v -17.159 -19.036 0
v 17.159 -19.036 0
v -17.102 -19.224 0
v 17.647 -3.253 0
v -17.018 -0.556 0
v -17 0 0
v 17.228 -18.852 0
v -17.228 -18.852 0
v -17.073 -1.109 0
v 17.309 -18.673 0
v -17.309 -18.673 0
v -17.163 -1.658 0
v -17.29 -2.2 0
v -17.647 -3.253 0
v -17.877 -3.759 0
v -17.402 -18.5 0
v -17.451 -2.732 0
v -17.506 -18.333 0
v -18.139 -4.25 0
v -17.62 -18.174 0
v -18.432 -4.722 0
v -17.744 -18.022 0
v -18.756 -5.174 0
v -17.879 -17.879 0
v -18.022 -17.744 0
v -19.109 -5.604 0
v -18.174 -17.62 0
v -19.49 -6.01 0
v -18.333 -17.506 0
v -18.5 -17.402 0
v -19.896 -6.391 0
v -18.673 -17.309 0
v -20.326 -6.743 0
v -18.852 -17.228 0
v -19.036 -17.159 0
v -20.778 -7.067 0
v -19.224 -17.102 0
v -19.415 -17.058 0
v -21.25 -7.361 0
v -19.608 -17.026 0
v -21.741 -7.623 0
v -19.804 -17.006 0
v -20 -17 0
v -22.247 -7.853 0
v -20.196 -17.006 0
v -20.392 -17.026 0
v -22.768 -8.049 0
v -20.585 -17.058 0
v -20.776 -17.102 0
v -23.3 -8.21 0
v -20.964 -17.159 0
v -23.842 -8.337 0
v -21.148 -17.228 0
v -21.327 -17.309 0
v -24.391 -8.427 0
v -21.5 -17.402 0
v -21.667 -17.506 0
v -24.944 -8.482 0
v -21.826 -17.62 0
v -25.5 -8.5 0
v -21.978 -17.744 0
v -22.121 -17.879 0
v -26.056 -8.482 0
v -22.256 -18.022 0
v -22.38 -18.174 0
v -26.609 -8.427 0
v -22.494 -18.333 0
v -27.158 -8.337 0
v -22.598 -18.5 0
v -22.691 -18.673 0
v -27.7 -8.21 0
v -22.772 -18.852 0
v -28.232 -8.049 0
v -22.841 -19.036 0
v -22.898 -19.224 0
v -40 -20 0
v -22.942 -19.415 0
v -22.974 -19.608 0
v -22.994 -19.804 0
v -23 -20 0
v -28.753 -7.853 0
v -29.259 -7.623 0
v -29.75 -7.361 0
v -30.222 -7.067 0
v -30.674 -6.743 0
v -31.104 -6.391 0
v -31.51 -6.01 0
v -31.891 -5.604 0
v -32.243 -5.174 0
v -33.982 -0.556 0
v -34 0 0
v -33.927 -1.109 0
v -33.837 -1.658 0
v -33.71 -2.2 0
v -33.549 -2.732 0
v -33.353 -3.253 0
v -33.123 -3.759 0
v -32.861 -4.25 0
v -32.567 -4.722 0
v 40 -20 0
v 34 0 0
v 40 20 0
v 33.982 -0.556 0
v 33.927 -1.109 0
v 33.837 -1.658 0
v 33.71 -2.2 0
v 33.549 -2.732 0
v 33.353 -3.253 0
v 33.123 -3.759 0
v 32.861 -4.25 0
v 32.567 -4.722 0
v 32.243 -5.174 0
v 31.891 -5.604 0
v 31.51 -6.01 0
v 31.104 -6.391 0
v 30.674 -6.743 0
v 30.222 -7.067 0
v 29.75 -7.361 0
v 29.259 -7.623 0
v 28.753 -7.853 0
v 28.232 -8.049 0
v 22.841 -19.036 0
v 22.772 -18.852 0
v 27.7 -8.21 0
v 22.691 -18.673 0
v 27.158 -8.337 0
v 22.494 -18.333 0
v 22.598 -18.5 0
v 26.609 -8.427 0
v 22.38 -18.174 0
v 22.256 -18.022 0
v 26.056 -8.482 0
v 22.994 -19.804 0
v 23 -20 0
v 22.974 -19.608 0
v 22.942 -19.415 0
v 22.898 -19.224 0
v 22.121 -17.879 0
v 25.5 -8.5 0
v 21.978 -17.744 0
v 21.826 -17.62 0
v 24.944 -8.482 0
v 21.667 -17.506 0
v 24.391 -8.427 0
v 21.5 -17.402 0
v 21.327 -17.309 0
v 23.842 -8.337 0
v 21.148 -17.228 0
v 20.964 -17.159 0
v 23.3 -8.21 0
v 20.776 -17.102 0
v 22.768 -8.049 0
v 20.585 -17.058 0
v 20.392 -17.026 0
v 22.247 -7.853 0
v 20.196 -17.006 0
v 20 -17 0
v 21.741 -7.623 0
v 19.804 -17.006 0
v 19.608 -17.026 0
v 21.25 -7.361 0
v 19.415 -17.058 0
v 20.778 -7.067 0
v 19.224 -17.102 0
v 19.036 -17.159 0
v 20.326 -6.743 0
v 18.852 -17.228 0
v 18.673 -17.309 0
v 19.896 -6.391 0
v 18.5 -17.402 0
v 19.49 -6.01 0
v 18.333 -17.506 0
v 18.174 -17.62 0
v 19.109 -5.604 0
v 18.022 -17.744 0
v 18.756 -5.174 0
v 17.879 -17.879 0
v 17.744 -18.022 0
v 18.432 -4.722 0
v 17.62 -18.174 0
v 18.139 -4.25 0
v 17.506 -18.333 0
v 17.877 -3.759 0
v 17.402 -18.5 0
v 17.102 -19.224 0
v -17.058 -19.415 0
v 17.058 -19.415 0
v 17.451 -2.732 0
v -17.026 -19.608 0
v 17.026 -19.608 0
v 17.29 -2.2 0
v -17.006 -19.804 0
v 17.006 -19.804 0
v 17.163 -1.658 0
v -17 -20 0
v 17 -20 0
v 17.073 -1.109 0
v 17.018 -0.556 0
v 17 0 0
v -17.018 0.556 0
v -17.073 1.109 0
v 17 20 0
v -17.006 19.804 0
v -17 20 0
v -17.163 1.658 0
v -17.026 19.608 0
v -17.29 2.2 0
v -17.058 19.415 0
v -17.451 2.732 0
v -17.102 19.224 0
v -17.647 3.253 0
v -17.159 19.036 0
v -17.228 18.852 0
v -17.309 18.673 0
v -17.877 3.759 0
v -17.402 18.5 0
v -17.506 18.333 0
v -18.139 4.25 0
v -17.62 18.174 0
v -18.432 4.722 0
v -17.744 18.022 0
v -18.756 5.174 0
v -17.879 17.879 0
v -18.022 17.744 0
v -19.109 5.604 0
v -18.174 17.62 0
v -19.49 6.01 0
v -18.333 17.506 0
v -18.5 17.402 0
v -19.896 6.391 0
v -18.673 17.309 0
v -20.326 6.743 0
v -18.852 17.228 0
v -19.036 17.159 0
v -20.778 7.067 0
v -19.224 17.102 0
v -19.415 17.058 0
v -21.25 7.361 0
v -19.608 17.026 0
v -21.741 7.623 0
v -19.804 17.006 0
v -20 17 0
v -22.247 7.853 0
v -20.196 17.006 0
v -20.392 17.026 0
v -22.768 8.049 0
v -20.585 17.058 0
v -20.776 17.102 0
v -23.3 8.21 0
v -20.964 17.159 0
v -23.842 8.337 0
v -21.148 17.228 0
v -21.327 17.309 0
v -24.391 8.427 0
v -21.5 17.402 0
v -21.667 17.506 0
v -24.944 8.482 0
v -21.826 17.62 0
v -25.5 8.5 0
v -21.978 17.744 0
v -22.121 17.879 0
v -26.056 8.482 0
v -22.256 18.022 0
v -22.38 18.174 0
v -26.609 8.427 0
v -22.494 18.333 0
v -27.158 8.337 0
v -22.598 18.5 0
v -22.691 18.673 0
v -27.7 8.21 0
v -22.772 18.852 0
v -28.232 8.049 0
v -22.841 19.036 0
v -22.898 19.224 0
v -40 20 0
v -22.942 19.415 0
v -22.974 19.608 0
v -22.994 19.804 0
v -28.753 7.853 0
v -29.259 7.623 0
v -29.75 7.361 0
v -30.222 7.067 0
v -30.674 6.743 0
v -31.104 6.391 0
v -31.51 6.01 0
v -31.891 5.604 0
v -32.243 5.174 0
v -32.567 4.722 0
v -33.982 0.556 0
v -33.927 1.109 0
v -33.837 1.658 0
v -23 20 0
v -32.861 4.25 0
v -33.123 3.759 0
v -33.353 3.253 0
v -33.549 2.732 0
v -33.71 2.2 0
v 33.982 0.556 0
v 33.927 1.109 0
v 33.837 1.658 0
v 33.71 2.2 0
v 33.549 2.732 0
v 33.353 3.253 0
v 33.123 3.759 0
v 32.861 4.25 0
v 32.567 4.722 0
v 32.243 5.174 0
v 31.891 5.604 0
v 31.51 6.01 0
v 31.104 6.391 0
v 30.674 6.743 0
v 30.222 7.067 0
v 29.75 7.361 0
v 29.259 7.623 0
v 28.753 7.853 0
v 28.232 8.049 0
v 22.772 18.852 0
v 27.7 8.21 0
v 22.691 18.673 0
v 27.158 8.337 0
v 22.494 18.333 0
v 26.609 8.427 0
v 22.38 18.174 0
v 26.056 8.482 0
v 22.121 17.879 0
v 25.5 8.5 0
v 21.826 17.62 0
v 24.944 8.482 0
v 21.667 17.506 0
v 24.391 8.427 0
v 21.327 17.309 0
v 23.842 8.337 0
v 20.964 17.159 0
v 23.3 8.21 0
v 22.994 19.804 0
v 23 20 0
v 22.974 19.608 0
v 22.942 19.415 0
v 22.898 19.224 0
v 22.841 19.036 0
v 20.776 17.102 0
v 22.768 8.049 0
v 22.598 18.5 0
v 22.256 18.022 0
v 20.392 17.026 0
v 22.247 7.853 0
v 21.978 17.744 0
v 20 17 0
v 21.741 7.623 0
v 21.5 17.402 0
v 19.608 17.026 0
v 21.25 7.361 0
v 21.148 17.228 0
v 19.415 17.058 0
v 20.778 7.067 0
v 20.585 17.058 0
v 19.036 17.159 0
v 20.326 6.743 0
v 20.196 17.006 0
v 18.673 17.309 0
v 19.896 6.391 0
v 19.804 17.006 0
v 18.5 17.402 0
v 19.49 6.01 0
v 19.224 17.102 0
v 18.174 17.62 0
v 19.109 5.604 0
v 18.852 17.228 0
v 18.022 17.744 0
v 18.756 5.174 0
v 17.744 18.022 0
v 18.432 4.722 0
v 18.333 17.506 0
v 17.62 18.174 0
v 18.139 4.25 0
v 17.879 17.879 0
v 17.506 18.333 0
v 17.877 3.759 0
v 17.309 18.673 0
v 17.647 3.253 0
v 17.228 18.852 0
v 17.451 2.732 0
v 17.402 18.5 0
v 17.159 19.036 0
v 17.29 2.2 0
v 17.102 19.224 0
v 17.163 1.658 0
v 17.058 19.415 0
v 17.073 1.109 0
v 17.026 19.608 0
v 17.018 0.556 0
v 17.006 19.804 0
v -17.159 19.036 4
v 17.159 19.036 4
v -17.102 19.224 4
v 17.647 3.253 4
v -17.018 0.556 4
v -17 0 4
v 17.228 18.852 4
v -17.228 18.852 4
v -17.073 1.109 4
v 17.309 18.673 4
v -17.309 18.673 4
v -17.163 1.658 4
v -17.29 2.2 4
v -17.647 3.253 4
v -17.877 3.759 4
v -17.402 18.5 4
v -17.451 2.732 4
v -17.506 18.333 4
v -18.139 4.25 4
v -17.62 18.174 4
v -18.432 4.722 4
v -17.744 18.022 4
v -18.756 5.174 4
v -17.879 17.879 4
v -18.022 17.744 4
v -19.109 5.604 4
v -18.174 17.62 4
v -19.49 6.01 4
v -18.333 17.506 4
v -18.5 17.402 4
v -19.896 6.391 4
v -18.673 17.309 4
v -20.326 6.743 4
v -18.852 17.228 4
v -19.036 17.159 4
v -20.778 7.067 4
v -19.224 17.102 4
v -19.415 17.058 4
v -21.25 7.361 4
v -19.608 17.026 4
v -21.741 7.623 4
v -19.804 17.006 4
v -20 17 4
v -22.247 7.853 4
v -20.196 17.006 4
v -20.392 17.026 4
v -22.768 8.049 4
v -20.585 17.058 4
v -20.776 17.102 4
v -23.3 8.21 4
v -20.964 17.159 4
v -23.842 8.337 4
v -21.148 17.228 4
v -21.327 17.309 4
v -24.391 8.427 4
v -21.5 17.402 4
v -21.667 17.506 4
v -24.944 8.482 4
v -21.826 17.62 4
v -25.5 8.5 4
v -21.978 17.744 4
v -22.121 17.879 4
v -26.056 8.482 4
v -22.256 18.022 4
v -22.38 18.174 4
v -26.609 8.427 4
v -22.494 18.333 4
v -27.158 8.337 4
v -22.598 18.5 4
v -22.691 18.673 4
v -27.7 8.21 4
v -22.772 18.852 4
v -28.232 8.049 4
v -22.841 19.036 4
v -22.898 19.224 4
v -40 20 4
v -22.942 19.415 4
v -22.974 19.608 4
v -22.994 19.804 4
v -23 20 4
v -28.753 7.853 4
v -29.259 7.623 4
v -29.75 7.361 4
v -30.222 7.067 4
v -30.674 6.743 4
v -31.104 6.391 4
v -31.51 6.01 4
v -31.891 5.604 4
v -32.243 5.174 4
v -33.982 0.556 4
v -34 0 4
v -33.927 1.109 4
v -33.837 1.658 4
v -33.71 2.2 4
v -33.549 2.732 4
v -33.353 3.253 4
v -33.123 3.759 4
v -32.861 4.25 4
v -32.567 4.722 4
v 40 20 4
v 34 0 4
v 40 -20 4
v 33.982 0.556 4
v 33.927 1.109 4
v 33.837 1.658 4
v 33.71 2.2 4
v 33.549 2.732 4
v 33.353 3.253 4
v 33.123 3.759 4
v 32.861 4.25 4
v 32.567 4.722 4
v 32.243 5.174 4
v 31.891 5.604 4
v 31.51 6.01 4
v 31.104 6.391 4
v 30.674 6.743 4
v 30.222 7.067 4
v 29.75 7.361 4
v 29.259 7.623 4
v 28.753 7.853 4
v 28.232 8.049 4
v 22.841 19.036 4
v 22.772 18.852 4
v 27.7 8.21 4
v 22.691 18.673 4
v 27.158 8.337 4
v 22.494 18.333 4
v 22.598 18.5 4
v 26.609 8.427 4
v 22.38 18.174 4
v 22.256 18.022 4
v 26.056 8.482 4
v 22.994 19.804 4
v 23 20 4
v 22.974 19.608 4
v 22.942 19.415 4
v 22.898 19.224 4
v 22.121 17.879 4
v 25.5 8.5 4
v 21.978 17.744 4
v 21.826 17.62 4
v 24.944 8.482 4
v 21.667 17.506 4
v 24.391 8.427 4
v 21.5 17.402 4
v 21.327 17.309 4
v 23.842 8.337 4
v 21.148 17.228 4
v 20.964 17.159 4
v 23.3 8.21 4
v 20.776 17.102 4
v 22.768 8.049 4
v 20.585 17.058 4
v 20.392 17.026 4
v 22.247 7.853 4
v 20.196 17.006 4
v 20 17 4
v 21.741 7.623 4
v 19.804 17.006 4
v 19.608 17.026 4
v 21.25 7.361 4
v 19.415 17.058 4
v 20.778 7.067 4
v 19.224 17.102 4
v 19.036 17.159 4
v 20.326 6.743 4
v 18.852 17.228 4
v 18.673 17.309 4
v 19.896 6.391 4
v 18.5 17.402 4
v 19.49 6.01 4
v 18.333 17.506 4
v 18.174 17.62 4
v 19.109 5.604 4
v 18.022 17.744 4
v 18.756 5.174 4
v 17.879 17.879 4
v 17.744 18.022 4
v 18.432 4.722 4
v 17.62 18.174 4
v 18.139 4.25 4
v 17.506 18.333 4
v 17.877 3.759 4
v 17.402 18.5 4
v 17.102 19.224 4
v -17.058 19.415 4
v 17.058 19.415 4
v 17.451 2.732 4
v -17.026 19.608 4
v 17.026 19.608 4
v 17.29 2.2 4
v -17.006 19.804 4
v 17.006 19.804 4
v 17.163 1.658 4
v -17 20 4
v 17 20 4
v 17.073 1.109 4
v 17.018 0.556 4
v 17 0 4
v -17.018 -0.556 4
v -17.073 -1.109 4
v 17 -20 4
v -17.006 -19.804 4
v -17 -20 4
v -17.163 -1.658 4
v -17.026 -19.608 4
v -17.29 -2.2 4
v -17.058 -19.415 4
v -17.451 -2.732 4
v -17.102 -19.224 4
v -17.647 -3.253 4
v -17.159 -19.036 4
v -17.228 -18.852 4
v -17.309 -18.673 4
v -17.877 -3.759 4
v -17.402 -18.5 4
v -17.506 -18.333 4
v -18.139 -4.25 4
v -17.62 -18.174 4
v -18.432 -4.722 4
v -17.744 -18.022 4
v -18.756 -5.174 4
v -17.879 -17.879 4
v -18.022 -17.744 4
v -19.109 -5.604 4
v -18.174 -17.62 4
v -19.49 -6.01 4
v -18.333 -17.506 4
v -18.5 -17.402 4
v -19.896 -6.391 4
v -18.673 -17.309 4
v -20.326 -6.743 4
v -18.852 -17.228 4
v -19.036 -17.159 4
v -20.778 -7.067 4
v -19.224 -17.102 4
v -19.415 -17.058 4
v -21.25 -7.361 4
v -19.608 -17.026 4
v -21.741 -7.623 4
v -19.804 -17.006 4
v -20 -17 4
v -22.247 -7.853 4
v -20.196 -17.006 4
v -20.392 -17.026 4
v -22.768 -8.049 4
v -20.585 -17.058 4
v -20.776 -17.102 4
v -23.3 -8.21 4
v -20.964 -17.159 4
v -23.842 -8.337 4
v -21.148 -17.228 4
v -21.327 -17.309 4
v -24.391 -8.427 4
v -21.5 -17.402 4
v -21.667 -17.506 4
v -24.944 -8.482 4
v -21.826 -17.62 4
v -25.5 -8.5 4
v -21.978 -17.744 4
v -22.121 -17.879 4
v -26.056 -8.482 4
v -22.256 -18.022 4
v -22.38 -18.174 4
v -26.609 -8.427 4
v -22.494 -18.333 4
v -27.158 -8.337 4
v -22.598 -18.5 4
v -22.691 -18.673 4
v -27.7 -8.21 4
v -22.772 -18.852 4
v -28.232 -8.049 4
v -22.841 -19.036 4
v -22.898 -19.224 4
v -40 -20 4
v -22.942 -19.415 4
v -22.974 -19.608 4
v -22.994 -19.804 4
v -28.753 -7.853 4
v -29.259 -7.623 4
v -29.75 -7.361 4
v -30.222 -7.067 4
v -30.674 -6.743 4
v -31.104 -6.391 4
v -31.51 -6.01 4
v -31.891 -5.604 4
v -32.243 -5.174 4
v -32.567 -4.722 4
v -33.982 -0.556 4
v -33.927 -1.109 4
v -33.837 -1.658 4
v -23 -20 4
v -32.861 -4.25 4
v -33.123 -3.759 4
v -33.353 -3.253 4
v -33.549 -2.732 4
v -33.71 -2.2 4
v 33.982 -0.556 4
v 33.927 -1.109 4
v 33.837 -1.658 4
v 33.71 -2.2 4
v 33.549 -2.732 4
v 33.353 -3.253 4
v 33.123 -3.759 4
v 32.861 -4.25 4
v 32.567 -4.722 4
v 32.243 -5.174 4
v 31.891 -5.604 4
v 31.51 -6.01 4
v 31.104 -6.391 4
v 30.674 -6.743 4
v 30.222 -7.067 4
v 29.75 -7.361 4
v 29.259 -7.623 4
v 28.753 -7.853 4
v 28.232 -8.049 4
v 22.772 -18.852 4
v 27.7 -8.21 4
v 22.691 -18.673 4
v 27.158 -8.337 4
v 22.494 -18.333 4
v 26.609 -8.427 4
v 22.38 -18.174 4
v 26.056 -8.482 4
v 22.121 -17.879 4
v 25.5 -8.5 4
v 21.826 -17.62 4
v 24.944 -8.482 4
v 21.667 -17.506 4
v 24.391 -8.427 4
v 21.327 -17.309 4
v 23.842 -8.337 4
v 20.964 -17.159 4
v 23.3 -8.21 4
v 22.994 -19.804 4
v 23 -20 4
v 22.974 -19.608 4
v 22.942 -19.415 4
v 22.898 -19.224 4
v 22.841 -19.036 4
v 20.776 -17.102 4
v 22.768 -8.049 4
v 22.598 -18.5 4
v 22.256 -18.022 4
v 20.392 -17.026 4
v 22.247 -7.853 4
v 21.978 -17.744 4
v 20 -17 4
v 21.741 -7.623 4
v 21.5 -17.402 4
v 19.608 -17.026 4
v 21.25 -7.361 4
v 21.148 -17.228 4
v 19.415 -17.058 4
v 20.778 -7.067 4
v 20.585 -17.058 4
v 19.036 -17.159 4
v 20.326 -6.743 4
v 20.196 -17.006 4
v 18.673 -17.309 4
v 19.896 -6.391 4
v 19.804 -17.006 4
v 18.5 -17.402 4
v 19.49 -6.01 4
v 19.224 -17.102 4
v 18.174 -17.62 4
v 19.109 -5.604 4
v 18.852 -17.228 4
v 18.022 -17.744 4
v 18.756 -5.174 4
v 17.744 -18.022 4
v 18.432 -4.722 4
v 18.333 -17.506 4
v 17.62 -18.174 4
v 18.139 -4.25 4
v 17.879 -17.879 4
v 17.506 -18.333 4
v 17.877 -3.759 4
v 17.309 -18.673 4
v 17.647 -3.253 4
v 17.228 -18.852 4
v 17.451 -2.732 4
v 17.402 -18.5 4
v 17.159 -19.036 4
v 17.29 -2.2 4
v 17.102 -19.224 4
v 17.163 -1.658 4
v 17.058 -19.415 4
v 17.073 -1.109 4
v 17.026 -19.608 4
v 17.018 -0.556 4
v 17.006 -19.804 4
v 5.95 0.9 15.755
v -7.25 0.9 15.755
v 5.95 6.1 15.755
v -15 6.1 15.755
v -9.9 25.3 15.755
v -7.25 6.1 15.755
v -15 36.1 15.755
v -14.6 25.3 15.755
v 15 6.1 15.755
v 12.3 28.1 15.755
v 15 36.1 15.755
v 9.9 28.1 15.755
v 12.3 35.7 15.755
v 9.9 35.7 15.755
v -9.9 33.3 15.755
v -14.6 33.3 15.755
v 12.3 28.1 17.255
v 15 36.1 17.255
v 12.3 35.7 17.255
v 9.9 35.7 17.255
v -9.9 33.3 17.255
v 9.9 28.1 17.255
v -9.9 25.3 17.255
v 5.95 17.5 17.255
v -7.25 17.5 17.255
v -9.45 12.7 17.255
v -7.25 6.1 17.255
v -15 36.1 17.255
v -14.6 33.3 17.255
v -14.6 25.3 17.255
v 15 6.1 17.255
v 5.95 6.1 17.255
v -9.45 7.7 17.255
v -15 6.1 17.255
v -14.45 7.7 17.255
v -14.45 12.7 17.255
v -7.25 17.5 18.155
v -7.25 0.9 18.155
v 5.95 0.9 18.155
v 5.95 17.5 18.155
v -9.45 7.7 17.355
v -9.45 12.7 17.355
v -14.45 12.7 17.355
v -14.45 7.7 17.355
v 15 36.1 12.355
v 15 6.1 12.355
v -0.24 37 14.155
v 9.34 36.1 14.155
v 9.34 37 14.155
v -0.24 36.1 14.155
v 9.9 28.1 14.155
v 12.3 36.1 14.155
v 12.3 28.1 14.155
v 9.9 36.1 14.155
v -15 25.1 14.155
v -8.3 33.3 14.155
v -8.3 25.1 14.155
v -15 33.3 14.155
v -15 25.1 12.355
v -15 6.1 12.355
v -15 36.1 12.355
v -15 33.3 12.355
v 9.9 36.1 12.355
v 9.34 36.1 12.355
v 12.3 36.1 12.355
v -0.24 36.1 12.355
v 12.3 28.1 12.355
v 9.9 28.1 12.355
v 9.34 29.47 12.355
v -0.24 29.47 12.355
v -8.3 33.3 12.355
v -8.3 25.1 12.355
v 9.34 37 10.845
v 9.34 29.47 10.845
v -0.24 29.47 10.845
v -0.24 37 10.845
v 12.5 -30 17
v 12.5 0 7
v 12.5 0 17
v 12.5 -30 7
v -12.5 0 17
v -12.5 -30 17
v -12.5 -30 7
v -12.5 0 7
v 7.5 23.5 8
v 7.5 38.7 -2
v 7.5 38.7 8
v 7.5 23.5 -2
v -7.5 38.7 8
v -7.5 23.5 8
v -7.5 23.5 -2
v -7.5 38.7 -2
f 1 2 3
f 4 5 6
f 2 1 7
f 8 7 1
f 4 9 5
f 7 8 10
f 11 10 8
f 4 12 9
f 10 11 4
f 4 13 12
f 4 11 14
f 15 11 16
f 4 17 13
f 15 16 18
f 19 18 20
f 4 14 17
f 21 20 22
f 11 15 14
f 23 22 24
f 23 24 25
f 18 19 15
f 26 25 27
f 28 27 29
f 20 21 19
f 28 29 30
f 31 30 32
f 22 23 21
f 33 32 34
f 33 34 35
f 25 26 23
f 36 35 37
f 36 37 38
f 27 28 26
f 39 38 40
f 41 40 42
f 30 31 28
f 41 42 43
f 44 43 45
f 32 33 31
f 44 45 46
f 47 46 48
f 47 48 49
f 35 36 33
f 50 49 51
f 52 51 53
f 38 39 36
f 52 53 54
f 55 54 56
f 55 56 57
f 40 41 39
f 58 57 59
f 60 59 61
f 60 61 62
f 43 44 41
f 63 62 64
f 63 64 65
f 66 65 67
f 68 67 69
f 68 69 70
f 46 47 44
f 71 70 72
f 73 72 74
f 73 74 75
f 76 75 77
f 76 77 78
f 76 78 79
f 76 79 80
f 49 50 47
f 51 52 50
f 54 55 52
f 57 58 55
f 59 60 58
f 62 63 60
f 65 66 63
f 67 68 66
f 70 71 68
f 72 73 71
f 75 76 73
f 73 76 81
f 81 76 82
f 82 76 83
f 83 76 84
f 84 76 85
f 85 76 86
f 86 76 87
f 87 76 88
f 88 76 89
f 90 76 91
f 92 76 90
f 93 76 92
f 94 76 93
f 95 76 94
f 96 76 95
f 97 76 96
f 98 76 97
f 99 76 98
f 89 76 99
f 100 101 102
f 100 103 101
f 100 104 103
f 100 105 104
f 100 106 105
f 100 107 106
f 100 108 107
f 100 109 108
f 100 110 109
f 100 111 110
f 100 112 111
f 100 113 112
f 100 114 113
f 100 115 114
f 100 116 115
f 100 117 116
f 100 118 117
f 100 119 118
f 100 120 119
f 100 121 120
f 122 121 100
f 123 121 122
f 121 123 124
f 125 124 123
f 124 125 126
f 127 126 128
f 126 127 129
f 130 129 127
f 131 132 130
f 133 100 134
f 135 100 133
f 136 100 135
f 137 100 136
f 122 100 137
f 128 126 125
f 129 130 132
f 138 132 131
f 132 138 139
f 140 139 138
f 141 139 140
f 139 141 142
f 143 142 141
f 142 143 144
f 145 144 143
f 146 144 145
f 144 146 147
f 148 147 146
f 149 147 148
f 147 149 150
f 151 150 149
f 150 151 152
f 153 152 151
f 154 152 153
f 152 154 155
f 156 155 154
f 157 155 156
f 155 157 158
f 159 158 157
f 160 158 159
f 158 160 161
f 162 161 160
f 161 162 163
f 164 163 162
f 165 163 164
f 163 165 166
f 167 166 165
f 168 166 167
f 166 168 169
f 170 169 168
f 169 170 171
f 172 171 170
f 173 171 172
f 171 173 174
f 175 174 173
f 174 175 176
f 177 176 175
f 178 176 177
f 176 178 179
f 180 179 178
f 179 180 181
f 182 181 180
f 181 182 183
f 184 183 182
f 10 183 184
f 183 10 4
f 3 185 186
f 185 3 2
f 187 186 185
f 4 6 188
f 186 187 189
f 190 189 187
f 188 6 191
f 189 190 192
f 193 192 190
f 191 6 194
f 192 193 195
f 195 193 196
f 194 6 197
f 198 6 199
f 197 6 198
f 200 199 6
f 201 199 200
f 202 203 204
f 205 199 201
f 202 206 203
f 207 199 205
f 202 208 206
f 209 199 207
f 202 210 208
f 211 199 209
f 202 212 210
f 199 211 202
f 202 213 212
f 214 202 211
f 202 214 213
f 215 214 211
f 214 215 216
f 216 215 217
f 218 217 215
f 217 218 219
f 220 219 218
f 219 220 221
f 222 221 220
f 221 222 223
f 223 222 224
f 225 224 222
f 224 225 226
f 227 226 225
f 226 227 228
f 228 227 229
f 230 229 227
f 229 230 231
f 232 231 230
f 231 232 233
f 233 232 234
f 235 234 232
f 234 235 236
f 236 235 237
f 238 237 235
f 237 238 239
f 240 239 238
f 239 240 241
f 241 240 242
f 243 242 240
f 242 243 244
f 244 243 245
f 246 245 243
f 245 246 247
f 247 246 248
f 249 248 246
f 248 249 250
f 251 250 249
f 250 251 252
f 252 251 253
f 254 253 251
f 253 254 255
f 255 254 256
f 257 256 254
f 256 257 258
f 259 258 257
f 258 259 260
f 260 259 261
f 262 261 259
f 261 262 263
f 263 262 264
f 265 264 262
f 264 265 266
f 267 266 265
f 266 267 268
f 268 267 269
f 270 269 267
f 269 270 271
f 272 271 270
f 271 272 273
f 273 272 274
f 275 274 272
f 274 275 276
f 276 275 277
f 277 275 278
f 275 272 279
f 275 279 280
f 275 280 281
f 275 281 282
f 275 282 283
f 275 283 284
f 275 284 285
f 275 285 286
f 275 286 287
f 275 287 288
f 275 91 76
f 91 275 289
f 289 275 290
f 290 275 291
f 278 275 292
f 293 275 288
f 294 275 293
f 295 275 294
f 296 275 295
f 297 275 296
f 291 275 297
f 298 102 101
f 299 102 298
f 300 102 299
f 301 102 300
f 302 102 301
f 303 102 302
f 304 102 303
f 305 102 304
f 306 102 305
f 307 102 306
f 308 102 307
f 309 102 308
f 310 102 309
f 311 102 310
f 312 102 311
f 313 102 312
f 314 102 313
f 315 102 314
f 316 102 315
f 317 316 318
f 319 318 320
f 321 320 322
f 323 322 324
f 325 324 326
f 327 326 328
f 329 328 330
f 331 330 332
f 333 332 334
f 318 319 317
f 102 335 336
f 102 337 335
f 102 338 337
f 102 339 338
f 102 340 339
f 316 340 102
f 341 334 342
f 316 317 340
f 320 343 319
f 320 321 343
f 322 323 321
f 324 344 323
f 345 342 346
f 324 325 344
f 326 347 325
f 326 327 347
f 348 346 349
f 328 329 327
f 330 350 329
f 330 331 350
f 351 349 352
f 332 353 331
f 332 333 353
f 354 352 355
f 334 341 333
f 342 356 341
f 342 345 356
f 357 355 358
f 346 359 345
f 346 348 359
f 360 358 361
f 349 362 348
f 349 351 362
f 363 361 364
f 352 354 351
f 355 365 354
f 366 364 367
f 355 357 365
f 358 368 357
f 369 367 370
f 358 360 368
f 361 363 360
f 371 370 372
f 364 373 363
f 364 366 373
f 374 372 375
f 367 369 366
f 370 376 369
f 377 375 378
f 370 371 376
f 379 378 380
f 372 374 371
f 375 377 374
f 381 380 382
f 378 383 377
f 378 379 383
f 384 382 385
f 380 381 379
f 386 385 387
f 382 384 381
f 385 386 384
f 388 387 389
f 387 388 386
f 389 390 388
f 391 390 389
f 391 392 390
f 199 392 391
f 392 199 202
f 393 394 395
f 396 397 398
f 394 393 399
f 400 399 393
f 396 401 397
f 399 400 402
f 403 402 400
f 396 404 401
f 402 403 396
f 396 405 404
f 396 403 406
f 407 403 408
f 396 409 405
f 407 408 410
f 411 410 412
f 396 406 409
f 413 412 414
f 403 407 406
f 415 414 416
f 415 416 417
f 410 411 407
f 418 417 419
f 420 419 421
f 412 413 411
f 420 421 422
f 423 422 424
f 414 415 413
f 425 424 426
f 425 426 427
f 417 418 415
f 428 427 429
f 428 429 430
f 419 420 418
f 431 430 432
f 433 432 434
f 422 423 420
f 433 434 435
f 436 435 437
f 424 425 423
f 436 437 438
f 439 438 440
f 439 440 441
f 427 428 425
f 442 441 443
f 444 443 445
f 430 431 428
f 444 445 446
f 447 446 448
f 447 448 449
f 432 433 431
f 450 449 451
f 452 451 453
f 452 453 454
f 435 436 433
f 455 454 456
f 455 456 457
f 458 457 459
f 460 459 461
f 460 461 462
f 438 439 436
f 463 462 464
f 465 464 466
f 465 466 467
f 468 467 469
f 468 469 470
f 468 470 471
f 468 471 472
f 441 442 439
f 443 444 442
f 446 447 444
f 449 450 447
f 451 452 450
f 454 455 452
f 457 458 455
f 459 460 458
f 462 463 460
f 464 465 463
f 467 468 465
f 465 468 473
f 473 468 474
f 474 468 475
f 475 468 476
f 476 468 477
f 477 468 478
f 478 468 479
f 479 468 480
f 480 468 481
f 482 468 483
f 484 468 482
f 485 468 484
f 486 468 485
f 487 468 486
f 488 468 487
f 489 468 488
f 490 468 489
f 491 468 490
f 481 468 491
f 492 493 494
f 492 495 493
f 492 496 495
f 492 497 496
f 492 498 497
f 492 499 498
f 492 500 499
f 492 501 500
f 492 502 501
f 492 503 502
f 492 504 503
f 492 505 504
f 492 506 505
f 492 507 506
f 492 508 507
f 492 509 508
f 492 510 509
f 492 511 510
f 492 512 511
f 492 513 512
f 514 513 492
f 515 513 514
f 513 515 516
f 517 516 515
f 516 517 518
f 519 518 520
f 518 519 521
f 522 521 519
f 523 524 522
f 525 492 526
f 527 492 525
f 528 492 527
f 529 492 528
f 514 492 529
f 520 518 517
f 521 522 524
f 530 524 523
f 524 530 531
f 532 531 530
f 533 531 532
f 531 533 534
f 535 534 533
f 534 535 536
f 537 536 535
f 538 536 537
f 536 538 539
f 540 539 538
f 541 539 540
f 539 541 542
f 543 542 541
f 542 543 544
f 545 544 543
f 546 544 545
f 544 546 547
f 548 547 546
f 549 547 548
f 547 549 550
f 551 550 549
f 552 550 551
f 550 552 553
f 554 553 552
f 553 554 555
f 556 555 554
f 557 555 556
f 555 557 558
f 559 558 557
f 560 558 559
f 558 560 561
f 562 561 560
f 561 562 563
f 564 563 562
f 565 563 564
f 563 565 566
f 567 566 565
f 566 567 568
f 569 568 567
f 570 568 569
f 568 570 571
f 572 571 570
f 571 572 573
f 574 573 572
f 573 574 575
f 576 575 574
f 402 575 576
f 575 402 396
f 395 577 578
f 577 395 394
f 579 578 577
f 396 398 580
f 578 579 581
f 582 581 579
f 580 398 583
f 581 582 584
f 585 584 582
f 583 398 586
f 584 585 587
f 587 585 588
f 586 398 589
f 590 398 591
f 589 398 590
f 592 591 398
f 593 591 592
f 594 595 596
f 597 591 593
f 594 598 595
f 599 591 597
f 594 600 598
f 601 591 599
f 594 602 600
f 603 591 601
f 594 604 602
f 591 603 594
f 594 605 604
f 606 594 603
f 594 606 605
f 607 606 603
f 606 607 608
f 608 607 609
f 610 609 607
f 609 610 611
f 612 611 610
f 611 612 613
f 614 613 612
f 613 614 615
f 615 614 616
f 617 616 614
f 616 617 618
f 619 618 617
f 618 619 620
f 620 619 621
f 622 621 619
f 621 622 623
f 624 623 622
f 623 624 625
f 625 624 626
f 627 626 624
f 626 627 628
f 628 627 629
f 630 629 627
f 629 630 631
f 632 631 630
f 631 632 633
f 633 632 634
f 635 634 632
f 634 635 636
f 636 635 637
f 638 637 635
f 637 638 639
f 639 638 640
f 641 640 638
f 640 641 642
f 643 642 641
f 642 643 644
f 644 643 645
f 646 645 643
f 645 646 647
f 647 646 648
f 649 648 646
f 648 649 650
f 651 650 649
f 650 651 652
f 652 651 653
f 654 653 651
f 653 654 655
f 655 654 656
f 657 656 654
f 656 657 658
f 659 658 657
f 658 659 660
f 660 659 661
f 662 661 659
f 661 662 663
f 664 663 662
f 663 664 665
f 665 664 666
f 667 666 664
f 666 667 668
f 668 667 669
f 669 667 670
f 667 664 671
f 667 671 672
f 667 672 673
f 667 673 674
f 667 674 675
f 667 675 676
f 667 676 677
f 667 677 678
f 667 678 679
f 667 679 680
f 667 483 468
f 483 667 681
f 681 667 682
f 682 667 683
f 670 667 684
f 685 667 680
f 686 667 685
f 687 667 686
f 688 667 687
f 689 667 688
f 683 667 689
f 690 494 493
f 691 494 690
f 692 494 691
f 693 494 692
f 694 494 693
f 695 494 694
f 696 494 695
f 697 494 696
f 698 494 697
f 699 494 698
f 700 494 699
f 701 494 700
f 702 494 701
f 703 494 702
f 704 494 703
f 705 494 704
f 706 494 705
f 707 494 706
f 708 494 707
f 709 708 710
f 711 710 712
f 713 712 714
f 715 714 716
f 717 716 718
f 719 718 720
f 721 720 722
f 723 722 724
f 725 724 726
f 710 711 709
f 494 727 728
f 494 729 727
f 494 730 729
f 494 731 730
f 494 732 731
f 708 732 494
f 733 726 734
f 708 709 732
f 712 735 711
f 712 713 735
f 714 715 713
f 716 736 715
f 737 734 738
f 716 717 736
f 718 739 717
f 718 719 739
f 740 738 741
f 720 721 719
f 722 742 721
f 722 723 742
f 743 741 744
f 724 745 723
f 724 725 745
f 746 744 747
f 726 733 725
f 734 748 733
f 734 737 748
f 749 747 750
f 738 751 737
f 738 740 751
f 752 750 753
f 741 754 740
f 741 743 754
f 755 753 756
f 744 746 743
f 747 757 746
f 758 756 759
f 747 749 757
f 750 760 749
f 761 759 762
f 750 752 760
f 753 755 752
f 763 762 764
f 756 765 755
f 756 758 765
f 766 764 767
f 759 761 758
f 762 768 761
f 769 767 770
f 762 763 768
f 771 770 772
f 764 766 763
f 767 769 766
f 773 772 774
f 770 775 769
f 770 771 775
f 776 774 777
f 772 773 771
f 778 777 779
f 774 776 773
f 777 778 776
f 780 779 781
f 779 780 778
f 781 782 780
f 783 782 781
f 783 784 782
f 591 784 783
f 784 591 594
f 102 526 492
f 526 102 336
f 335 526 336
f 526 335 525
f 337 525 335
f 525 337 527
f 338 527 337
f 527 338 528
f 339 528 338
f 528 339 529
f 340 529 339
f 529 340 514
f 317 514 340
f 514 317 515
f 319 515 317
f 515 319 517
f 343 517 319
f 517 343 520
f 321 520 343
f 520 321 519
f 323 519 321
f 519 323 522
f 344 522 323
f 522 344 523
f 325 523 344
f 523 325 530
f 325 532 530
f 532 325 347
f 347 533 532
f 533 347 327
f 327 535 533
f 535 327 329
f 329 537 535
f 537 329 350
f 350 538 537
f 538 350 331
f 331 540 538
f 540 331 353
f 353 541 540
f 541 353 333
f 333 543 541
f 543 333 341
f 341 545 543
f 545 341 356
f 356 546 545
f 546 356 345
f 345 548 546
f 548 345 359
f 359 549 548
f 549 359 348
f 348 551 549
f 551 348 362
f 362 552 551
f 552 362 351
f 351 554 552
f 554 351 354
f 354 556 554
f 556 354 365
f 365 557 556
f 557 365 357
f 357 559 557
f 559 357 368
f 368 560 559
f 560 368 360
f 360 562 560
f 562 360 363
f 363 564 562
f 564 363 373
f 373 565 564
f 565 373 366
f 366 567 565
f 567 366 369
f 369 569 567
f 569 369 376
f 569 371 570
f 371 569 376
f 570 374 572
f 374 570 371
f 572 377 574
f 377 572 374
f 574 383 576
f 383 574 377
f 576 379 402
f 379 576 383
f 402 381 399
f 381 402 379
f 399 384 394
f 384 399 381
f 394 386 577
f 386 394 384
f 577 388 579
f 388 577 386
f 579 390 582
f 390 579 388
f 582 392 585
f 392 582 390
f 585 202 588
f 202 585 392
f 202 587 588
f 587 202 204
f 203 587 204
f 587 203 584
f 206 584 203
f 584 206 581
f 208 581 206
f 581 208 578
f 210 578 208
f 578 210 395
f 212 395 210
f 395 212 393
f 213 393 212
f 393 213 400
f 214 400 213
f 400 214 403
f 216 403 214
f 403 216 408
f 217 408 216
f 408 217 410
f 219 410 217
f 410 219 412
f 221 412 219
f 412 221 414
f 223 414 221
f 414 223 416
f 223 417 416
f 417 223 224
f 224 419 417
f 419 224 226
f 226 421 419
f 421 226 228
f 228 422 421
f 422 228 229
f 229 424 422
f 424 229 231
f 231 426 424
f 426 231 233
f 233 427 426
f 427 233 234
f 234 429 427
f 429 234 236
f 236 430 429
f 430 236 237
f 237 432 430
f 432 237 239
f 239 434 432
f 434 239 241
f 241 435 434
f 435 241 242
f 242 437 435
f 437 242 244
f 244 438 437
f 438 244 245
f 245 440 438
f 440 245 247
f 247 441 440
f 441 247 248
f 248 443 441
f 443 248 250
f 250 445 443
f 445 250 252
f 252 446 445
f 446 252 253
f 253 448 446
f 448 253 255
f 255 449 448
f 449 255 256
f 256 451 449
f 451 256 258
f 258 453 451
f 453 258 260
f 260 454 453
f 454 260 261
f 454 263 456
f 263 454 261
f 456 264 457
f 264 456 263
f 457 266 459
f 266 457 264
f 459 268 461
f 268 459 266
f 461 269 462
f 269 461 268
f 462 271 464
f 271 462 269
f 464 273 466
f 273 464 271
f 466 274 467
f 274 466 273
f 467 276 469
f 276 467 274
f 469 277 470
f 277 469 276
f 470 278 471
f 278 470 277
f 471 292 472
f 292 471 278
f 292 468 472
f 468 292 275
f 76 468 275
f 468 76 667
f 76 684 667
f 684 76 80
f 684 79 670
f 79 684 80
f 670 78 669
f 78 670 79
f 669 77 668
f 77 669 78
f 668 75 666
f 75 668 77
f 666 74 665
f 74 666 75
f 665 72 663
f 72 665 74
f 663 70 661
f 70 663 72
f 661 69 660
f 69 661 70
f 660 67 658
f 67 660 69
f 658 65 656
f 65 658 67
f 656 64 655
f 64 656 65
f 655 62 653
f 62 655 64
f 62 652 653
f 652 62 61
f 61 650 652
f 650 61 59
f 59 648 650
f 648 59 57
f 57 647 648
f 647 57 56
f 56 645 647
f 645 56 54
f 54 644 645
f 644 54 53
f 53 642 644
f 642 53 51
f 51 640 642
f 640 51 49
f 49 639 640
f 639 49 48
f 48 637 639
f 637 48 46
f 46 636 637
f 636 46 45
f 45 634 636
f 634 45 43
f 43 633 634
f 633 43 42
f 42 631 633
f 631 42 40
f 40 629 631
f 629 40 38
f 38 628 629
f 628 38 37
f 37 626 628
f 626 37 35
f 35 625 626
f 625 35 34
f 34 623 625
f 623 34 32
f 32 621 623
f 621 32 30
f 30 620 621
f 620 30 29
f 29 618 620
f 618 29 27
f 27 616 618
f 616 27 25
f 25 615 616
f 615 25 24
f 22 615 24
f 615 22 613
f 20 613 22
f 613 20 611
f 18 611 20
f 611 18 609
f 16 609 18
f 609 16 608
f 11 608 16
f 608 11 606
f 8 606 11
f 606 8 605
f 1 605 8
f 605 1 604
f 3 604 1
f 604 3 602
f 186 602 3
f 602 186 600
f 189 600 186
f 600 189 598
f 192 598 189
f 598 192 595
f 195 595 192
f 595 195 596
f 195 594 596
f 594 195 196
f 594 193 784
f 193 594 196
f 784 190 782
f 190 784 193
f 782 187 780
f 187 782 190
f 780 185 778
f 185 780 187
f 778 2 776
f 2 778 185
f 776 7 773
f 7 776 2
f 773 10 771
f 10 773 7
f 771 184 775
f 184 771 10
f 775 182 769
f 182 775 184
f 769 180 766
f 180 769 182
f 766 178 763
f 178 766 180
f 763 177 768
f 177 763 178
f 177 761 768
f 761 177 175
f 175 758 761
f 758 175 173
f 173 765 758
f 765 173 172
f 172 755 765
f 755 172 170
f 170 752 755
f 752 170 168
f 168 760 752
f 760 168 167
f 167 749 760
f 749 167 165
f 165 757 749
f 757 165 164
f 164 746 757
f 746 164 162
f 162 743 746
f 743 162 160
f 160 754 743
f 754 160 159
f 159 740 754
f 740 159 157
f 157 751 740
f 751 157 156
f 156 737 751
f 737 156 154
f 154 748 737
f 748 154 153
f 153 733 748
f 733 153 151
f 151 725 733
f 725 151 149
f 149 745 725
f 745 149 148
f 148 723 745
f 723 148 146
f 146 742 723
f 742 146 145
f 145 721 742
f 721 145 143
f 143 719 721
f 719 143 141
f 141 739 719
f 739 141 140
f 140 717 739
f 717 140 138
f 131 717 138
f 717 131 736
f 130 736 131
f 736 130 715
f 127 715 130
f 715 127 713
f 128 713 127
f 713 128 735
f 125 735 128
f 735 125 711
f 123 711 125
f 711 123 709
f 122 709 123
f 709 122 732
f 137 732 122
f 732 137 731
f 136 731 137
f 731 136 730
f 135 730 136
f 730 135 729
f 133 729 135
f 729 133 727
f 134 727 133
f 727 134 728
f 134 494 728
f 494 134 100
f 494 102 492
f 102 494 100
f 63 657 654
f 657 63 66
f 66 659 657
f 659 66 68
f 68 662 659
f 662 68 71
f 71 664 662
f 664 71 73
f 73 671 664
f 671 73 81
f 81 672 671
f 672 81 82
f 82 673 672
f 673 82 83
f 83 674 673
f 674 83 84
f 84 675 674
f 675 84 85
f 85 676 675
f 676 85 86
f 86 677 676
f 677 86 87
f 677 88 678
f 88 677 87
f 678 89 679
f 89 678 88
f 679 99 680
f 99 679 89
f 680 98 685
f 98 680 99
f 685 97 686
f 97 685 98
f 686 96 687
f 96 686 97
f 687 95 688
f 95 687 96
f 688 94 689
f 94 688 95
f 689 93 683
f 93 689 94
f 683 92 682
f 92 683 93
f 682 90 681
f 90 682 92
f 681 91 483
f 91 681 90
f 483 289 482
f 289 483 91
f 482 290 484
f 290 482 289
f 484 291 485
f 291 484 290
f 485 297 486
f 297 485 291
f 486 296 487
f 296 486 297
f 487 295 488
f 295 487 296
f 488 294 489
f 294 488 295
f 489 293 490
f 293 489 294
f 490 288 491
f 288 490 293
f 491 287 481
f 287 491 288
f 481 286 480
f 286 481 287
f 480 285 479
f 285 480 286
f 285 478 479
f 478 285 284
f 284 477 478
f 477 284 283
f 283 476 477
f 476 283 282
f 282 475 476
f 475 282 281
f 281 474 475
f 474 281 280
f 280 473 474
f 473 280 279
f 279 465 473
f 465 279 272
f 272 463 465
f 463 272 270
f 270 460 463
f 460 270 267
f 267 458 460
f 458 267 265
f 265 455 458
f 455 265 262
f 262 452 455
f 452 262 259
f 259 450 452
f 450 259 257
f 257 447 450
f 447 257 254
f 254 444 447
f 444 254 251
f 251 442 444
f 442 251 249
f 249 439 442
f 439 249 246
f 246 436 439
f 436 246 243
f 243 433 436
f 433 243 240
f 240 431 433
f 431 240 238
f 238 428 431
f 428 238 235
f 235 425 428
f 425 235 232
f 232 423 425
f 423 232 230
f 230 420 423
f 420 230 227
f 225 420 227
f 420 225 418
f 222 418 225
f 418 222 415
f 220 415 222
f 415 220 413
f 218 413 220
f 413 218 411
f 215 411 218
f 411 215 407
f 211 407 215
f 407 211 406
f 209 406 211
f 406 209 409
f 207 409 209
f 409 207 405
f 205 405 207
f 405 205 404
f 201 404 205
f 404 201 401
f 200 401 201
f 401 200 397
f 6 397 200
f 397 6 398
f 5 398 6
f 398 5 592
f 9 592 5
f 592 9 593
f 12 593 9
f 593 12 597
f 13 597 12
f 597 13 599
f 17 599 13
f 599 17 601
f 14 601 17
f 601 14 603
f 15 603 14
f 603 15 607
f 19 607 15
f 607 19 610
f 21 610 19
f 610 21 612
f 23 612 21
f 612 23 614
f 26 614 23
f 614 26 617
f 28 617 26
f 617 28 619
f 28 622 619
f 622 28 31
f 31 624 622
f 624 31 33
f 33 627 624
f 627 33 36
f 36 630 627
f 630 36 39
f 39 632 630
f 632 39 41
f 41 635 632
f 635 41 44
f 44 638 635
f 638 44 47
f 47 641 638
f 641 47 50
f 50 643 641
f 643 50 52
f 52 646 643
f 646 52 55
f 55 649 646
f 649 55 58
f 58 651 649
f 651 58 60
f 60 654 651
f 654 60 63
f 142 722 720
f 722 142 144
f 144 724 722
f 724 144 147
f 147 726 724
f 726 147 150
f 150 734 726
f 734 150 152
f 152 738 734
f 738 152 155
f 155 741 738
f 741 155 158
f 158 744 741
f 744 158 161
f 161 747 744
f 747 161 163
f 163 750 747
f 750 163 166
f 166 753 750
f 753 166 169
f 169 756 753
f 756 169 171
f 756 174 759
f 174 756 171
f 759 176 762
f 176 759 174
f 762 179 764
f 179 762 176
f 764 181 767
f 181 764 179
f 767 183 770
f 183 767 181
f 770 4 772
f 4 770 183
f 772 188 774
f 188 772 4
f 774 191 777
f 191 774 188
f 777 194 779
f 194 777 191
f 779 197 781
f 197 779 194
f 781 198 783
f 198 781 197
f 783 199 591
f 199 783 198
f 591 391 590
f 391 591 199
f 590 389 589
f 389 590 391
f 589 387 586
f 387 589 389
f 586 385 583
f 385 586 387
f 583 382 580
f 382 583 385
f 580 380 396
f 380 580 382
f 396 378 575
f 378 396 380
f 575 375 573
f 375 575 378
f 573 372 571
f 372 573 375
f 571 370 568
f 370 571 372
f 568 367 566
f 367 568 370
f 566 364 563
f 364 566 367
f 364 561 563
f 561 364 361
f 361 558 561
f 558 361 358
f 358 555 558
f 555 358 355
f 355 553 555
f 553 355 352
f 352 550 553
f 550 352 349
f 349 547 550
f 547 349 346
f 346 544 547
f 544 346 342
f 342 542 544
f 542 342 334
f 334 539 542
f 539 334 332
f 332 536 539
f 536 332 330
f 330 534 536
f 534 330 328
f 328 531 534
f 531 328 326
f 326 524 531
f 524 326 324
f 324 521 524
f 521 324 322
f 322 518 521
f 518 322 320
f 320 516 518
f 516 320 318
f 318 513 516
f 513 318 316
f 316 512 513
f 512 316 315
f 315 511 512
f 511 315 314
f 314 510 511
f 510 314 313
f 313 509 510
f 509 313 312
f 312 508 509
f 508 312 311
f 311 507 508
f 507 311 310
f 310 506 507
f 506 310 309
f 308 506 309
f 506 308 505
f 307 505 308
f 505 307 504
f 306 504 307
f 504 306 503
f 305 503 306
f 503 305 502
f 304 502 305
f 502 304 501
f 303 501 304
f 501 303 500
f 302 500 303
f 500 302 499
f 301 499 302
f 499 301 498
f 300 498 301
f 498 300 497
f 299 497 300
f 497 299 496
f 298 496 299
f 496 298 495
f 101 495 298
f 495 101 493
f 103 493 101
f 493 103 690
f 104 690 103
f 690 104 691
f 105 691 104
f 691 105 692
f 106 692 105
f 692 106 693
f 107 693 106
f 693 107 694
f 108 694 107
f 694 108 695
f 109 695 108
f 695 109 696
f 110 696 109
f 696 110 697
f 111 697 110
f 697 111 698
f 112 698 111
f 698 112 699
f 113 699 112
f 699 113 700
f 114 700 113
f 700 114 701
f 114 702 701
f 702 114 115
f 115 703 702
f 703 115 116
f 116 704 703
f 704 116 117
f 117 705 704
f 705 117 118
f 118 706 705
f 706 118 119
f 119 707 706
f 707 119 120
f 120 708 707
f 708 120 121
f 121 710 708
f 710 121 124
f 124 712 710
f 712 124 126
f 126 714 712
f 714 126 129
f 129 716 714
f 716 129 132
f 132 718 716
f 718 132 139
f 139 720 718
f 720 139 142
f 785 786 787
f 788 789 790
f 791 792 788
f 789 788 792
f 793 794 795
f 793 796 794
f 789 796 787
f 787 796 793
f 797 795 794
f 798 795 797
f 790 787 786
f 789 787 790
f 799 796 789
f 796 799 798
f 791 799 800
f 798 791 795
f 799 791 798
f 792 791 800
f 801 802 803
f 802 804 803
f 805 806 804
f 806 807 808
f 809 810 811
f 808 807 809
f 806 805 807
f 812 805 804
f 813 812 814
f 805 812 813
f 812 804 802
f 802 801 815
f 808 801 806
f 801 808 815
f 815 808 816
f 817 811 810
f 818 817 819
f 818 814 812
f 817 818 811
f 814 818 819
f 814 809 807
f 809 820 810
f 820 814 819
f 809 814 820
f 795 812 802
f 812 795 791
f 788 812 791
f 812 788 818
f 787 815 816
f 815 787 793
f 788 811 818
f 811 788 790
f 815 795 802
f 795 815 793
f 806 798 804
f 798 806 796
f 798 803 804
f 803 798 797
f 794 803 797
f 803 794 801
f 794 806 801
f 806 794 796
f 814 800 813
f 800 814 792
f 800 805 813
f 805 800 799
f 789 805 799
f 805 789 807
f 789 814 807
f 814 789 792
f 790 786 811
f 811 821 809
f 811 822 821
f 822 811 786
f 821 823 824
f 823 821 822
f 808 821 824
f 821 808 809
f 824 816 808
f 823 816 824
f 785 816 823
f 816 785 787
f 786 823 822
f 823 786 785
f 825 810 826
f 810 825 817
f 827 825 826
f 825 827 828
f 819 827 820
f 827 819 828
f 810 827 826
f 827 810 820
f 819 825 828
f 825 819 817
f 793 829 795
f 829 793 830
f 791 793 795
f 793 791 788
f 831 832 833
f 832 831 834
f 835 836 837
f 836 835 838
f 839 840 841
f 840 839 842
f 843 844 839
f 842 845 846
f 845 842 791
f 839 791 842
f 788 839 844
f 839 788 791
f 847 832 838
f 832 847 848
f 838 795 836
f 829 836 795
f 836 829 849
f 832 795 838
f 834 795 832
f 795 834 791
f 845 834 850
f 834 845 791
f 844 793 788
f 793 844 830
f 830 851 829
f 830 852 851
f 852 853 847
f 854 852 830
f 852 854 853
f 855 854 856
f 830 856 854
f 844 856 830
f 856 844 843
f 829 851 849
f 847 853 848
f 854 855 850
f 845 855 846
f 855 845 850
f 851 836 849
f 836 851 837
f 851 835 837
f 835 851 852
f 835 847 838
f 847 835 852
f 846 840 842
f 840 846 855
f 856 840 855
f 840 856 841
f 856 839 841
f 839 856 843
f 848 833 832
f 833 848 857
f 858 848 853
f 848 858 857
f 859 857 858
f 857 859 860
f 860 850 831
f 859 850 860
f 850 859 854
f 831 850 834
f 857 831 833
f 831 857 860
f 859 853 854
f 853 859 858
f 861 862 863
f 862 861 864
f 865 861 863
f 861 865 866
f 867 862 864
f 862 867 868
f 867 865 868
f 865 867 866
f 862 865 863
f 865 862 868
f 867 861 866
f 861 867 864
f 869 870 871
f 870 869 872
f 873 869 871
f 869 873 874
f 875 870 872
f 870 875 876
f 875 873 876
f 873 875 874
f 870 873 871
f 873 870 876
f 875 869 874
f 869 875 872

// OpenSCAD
// file: pcb.scad
//
// Revision 3 PCB with its component envelopes
// Units: mm
//

include <dimensions.scad>

render_fn = is_undef(render_fn) ? 64 : render_fn;
$fn = render_fn;

module pcb_rect_2d(r) {
    translate([r[0], r[2]])
        square([r[1] - r[0], r[3] - r[2]]);
}

// Board footprint minus the bare areas the case is allowed to touch.
module pcb_parts_2d(windows) {
    difference() {
        square([pcb_W, pcb_L], center = true);
        for (w = windows)
            pcb_rect_2d(w);
    }
}

// Origin: board center on its underside (KiCad F.Cu, toward the floor).
module pcb_model() {
    color("green")
        translate([0, 0, pcb_board_t / 2])
            cube([pcb_W, pcb_L, pcb_board_t], center = true);

    // F.Cu parts below the board; only the support windows are bare.
    color("darkgreen")
        translate([0, 0, -pcb_bottom_parts_h])
            linear_extrude(height = pcb_bottom_parts_h)
                pcb_parts_2d(pcb_support_windows);

    color("silver")
        translate([usb_x, usb_y, -usb_h / 2])
            cube([usb_w, usb_d, usb_h], center = true);

    // B.Cu parts face the lid; only the clamp windows are bare.
    translate([0, 0, pcb_board_t]) {
        color("darkgreen")
            linear_extrude(height = pcb_top_parts_h)
                pcb_parts_2d(pcb_clamp_windows);

        color("lightgray")
            linear_extrude(height = pcb_module_h)
                pcb_rect_2d(pcb_module_rect);

        translate([status_led_x, status_led_y, status_led_h / 2])
            color("yellow")
                cube([status_led_w, status_led_l, status_led_h], center = true);

        translate([rgb_led_x, rgb_led_y, rgb_led_h / 2])
            color("white")
                cube([rgb_led_w, rgb_led_l, rgb_led_h], center = true);
    }
}

pcb_model();
// file: battery.scad
//
// Battery model (envelope of the cell and its protection board)
// Units: mm
//

include <dimensions.scad>

module battery_model() {
    color("gray")
        cube([bat_W, bat_L, bat_T], center = true);
}

battery_model();
// file: load_cell.scad
//
// Load cell 2D profile (top view)
// Units: mm
//

include <dimensions.scad>

render_fn = is_undef(render_fn) ? 96 : render_fn;
$fn = render_fn;

// Derived hole centers
eye_x1 = eye_center_offset;
eye_x2 = lc_L - eye_center_offset;

module loadcell_2d() {
    difference() {
        // Main rectangle (centered)
        translate([-lc_L/2, -lc_W/2])
            square([lc_L, lc_W]);

        // Eye holes
        translate([-lc_L/2 + eye_x1, 0])
            circle(d=eye_d);

        translate([-lc_L/2 + eye_x2, 0])
            circle(d=eye_d);

        // Side notches (top side)
        translate([-lc_L/2 + notch_xA,  lc_W/2])
            circle(d=notch_d);

        translate([-lc_L/2 + notch_xB,  lc_W/2])
            circle(d=notch_d);

        // Side notches (bottom side)
        translate([-lc_L/2 + notch_xA, -lc_W/2])
            circle(d=notch_d);

        translate([-lc_L/2 + notch_xB, -lc_W/2])
            circle(d=notch_d);
    }
}

// Gauge cover under the plate; origin at the center of the plate's bottom
// face. Its wires leave the front (-Y) side.
module loadcell_gauge_cover() {
    translate([-gauge_cover_w / 2, -gauge_cover_y - gauge_cover_l / 2, -gauge_cover_h])
        cube([gauge_cover_w, gauge_cover_l, gauge_cover_h]);
}

// Render the load cell plane
loadcell_2d();
// main file
//
// Crimpdeq assembly: load cell + battery + PCB
// Units: mm
//

use <load_cell.scad>
use <battery.scad>
use <pcb.scad>
include <placement.scad>

render_fn = is_undef(render_fn) ? 96 : render_fn;
$fn = render_fn;

module loadcell_model() {
    color("silver")
        linear_extrude(height = lc_T, center = true)
            loadcell_2d();
    color("white")
        translate([0, 0, lc_T / 2])
            loadcell_gauge_cover();
}

module switch_model() {
    color("red")
        switch_body();
}

module full_assembly(show_pcb = true) {
    translate([0, 0, loadcell_center_z])
        loadcell_model();

    // Battery laying flat on top of the load cell.
    translate([0, battery_y_offset, battery_bottom_z + bat_T / 2])
        battery_model(rounded = true);

    if (show_pcb)
        // PCB laying flat on top of the battery.
        translate([0, pcb_y_offset, pcb_board_bottom_z])
            pcb_model();

    switch_model();
}

full_assembly();
